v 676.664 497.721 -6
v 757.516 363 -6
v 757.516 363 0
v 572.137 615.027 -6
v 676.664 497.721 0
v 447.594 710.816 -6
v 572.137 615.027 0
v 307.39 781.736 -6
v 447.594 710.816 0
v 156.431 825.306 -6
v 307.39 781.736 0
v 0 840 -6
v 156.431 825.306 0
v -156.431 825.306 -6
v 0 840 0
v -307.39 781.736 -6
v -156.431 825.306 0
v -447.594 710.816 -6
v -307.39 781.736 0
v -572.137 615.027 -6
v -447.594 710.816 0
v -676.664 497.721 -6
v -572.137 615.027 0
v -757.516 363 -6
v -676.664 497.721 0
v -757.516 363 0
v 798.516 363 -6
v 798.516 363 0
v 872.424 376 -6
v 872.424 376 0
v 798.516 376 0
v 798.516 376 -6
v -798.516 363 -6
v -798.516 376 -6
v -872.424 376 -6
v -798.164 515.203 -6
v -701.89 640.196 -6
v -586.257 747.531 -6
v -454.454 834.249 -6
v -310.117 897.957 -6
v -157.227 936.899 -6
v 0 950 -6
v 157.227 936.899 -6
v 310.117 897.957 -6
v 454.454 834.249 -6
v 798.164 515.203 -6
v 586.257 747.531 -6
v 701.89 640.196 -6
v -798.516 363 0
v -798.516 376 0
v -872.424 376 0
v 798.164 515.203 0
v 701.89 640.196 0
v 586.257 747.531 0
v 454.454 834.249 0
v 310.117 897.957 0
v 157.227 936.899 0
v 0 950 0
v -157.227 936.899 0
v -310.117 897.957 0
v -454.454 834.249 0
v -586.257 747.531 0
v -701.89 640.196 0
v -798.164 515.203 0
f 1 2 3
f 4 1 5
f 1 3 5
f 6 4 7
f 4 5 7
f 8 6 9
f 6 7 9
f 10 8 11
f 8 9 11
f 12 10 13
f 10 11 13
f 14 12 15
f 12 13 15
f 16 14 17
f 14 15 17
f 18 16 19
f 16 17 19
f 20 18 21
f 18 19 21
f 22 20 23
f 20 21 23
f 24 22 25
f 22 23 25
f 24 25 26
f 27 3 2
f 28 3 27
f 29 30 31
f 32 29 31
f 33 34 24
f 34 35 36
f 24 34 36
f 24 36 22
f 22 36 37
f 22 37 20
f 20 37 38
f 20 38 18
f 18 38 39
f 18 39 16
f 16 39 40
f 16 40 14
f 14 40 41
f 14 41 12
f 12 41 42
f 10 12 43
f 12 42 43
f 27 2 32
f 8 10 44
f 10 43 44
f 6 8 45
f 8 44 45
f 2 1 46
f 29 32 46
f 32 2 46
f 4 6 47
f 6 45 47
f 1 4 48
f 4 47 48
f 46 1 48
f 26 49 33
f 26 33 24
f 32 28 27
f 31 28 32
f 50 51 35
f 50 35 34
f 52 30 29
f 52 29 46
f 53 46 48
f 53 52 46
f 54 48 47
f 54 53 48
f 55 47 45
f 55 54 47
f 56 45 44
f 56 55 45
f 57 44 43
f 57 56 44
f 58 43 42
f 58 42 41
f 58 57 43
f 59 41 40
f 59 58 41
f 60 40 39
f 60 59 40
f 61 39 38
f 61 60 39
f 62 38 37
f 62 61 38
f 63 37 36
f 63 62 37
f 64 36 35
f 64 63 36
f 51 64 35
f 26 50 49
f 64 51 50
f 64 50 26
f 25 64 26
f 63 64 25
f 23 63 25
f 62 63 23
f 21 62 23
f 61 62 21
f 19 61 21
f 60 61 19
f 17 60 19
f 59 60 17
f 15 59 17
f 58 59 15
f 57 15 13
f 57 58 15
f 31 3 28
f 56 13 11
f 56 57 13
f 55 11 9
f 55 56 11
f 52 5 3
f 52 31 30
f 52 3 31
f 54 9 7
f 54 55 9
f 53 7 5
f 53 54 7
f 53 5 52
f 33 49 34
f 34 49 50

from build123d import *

# Parameters (mm, degrees)
SKETCH1_R          = 950
SKETCH1_R_2        = 840
BASE_FLANGE1_DEPTH = 6
SKETCH6_W          = 2732.981099596
SKETCH6_H          = 1353.854573776
CUT_EXTRUDE1_DEPTH = 10
SKETCH8_W          = 79.396529378
SKETCH8_H          = 13
CUT_EXTRUDE2_DEPTH = 10


# Sheet-metal steps are written as plain solids
with BuildPart() as part:
    # Sketch1 → Base-Flange1 (new body)
    with BuildSketch(Plane.XY):
        Circle(SKETCH1_R)
        Circle(SKETCH1_R_2, mode=Mode.SUBTRACT)
    extrude(amount=-BASE_FLANGE1_DEPTH)

    # Sketch6 → Cut-Extrude1 (cut)
    with BuildSketch(Plane.XY):
        with Locations((-160.657409421, -313.927286888)):
            Rectangle(SKETCH6_W, SKETCH6_H)
    extrude(amount=-CUT_EXTRUDE1_DEPTH, mode=Mode.SUBTRACT)

    # Sketch8 → Cut-Extrude2 (cut)
    with BuildSketch(Plane.XY):
        with Locations((-838.214601147, 369.5)):
            Rectangle(SKETCH8_W, SKETCH8_H)
    cut_extrude2 = extrude(amount=-CUT_EXTRUDE2_DEPTH, mode=Mode.SUBTRACT)

    # Mirror1: Cut-Extrude2 across plane
    add(cut_extrude2.mirror(Plane(origin=(0, 0, 0), x_dir=(0, 0, 1), z_dir=(1, 0, 0))), mode=Mode.SUBTRACT)


solid = part.part
